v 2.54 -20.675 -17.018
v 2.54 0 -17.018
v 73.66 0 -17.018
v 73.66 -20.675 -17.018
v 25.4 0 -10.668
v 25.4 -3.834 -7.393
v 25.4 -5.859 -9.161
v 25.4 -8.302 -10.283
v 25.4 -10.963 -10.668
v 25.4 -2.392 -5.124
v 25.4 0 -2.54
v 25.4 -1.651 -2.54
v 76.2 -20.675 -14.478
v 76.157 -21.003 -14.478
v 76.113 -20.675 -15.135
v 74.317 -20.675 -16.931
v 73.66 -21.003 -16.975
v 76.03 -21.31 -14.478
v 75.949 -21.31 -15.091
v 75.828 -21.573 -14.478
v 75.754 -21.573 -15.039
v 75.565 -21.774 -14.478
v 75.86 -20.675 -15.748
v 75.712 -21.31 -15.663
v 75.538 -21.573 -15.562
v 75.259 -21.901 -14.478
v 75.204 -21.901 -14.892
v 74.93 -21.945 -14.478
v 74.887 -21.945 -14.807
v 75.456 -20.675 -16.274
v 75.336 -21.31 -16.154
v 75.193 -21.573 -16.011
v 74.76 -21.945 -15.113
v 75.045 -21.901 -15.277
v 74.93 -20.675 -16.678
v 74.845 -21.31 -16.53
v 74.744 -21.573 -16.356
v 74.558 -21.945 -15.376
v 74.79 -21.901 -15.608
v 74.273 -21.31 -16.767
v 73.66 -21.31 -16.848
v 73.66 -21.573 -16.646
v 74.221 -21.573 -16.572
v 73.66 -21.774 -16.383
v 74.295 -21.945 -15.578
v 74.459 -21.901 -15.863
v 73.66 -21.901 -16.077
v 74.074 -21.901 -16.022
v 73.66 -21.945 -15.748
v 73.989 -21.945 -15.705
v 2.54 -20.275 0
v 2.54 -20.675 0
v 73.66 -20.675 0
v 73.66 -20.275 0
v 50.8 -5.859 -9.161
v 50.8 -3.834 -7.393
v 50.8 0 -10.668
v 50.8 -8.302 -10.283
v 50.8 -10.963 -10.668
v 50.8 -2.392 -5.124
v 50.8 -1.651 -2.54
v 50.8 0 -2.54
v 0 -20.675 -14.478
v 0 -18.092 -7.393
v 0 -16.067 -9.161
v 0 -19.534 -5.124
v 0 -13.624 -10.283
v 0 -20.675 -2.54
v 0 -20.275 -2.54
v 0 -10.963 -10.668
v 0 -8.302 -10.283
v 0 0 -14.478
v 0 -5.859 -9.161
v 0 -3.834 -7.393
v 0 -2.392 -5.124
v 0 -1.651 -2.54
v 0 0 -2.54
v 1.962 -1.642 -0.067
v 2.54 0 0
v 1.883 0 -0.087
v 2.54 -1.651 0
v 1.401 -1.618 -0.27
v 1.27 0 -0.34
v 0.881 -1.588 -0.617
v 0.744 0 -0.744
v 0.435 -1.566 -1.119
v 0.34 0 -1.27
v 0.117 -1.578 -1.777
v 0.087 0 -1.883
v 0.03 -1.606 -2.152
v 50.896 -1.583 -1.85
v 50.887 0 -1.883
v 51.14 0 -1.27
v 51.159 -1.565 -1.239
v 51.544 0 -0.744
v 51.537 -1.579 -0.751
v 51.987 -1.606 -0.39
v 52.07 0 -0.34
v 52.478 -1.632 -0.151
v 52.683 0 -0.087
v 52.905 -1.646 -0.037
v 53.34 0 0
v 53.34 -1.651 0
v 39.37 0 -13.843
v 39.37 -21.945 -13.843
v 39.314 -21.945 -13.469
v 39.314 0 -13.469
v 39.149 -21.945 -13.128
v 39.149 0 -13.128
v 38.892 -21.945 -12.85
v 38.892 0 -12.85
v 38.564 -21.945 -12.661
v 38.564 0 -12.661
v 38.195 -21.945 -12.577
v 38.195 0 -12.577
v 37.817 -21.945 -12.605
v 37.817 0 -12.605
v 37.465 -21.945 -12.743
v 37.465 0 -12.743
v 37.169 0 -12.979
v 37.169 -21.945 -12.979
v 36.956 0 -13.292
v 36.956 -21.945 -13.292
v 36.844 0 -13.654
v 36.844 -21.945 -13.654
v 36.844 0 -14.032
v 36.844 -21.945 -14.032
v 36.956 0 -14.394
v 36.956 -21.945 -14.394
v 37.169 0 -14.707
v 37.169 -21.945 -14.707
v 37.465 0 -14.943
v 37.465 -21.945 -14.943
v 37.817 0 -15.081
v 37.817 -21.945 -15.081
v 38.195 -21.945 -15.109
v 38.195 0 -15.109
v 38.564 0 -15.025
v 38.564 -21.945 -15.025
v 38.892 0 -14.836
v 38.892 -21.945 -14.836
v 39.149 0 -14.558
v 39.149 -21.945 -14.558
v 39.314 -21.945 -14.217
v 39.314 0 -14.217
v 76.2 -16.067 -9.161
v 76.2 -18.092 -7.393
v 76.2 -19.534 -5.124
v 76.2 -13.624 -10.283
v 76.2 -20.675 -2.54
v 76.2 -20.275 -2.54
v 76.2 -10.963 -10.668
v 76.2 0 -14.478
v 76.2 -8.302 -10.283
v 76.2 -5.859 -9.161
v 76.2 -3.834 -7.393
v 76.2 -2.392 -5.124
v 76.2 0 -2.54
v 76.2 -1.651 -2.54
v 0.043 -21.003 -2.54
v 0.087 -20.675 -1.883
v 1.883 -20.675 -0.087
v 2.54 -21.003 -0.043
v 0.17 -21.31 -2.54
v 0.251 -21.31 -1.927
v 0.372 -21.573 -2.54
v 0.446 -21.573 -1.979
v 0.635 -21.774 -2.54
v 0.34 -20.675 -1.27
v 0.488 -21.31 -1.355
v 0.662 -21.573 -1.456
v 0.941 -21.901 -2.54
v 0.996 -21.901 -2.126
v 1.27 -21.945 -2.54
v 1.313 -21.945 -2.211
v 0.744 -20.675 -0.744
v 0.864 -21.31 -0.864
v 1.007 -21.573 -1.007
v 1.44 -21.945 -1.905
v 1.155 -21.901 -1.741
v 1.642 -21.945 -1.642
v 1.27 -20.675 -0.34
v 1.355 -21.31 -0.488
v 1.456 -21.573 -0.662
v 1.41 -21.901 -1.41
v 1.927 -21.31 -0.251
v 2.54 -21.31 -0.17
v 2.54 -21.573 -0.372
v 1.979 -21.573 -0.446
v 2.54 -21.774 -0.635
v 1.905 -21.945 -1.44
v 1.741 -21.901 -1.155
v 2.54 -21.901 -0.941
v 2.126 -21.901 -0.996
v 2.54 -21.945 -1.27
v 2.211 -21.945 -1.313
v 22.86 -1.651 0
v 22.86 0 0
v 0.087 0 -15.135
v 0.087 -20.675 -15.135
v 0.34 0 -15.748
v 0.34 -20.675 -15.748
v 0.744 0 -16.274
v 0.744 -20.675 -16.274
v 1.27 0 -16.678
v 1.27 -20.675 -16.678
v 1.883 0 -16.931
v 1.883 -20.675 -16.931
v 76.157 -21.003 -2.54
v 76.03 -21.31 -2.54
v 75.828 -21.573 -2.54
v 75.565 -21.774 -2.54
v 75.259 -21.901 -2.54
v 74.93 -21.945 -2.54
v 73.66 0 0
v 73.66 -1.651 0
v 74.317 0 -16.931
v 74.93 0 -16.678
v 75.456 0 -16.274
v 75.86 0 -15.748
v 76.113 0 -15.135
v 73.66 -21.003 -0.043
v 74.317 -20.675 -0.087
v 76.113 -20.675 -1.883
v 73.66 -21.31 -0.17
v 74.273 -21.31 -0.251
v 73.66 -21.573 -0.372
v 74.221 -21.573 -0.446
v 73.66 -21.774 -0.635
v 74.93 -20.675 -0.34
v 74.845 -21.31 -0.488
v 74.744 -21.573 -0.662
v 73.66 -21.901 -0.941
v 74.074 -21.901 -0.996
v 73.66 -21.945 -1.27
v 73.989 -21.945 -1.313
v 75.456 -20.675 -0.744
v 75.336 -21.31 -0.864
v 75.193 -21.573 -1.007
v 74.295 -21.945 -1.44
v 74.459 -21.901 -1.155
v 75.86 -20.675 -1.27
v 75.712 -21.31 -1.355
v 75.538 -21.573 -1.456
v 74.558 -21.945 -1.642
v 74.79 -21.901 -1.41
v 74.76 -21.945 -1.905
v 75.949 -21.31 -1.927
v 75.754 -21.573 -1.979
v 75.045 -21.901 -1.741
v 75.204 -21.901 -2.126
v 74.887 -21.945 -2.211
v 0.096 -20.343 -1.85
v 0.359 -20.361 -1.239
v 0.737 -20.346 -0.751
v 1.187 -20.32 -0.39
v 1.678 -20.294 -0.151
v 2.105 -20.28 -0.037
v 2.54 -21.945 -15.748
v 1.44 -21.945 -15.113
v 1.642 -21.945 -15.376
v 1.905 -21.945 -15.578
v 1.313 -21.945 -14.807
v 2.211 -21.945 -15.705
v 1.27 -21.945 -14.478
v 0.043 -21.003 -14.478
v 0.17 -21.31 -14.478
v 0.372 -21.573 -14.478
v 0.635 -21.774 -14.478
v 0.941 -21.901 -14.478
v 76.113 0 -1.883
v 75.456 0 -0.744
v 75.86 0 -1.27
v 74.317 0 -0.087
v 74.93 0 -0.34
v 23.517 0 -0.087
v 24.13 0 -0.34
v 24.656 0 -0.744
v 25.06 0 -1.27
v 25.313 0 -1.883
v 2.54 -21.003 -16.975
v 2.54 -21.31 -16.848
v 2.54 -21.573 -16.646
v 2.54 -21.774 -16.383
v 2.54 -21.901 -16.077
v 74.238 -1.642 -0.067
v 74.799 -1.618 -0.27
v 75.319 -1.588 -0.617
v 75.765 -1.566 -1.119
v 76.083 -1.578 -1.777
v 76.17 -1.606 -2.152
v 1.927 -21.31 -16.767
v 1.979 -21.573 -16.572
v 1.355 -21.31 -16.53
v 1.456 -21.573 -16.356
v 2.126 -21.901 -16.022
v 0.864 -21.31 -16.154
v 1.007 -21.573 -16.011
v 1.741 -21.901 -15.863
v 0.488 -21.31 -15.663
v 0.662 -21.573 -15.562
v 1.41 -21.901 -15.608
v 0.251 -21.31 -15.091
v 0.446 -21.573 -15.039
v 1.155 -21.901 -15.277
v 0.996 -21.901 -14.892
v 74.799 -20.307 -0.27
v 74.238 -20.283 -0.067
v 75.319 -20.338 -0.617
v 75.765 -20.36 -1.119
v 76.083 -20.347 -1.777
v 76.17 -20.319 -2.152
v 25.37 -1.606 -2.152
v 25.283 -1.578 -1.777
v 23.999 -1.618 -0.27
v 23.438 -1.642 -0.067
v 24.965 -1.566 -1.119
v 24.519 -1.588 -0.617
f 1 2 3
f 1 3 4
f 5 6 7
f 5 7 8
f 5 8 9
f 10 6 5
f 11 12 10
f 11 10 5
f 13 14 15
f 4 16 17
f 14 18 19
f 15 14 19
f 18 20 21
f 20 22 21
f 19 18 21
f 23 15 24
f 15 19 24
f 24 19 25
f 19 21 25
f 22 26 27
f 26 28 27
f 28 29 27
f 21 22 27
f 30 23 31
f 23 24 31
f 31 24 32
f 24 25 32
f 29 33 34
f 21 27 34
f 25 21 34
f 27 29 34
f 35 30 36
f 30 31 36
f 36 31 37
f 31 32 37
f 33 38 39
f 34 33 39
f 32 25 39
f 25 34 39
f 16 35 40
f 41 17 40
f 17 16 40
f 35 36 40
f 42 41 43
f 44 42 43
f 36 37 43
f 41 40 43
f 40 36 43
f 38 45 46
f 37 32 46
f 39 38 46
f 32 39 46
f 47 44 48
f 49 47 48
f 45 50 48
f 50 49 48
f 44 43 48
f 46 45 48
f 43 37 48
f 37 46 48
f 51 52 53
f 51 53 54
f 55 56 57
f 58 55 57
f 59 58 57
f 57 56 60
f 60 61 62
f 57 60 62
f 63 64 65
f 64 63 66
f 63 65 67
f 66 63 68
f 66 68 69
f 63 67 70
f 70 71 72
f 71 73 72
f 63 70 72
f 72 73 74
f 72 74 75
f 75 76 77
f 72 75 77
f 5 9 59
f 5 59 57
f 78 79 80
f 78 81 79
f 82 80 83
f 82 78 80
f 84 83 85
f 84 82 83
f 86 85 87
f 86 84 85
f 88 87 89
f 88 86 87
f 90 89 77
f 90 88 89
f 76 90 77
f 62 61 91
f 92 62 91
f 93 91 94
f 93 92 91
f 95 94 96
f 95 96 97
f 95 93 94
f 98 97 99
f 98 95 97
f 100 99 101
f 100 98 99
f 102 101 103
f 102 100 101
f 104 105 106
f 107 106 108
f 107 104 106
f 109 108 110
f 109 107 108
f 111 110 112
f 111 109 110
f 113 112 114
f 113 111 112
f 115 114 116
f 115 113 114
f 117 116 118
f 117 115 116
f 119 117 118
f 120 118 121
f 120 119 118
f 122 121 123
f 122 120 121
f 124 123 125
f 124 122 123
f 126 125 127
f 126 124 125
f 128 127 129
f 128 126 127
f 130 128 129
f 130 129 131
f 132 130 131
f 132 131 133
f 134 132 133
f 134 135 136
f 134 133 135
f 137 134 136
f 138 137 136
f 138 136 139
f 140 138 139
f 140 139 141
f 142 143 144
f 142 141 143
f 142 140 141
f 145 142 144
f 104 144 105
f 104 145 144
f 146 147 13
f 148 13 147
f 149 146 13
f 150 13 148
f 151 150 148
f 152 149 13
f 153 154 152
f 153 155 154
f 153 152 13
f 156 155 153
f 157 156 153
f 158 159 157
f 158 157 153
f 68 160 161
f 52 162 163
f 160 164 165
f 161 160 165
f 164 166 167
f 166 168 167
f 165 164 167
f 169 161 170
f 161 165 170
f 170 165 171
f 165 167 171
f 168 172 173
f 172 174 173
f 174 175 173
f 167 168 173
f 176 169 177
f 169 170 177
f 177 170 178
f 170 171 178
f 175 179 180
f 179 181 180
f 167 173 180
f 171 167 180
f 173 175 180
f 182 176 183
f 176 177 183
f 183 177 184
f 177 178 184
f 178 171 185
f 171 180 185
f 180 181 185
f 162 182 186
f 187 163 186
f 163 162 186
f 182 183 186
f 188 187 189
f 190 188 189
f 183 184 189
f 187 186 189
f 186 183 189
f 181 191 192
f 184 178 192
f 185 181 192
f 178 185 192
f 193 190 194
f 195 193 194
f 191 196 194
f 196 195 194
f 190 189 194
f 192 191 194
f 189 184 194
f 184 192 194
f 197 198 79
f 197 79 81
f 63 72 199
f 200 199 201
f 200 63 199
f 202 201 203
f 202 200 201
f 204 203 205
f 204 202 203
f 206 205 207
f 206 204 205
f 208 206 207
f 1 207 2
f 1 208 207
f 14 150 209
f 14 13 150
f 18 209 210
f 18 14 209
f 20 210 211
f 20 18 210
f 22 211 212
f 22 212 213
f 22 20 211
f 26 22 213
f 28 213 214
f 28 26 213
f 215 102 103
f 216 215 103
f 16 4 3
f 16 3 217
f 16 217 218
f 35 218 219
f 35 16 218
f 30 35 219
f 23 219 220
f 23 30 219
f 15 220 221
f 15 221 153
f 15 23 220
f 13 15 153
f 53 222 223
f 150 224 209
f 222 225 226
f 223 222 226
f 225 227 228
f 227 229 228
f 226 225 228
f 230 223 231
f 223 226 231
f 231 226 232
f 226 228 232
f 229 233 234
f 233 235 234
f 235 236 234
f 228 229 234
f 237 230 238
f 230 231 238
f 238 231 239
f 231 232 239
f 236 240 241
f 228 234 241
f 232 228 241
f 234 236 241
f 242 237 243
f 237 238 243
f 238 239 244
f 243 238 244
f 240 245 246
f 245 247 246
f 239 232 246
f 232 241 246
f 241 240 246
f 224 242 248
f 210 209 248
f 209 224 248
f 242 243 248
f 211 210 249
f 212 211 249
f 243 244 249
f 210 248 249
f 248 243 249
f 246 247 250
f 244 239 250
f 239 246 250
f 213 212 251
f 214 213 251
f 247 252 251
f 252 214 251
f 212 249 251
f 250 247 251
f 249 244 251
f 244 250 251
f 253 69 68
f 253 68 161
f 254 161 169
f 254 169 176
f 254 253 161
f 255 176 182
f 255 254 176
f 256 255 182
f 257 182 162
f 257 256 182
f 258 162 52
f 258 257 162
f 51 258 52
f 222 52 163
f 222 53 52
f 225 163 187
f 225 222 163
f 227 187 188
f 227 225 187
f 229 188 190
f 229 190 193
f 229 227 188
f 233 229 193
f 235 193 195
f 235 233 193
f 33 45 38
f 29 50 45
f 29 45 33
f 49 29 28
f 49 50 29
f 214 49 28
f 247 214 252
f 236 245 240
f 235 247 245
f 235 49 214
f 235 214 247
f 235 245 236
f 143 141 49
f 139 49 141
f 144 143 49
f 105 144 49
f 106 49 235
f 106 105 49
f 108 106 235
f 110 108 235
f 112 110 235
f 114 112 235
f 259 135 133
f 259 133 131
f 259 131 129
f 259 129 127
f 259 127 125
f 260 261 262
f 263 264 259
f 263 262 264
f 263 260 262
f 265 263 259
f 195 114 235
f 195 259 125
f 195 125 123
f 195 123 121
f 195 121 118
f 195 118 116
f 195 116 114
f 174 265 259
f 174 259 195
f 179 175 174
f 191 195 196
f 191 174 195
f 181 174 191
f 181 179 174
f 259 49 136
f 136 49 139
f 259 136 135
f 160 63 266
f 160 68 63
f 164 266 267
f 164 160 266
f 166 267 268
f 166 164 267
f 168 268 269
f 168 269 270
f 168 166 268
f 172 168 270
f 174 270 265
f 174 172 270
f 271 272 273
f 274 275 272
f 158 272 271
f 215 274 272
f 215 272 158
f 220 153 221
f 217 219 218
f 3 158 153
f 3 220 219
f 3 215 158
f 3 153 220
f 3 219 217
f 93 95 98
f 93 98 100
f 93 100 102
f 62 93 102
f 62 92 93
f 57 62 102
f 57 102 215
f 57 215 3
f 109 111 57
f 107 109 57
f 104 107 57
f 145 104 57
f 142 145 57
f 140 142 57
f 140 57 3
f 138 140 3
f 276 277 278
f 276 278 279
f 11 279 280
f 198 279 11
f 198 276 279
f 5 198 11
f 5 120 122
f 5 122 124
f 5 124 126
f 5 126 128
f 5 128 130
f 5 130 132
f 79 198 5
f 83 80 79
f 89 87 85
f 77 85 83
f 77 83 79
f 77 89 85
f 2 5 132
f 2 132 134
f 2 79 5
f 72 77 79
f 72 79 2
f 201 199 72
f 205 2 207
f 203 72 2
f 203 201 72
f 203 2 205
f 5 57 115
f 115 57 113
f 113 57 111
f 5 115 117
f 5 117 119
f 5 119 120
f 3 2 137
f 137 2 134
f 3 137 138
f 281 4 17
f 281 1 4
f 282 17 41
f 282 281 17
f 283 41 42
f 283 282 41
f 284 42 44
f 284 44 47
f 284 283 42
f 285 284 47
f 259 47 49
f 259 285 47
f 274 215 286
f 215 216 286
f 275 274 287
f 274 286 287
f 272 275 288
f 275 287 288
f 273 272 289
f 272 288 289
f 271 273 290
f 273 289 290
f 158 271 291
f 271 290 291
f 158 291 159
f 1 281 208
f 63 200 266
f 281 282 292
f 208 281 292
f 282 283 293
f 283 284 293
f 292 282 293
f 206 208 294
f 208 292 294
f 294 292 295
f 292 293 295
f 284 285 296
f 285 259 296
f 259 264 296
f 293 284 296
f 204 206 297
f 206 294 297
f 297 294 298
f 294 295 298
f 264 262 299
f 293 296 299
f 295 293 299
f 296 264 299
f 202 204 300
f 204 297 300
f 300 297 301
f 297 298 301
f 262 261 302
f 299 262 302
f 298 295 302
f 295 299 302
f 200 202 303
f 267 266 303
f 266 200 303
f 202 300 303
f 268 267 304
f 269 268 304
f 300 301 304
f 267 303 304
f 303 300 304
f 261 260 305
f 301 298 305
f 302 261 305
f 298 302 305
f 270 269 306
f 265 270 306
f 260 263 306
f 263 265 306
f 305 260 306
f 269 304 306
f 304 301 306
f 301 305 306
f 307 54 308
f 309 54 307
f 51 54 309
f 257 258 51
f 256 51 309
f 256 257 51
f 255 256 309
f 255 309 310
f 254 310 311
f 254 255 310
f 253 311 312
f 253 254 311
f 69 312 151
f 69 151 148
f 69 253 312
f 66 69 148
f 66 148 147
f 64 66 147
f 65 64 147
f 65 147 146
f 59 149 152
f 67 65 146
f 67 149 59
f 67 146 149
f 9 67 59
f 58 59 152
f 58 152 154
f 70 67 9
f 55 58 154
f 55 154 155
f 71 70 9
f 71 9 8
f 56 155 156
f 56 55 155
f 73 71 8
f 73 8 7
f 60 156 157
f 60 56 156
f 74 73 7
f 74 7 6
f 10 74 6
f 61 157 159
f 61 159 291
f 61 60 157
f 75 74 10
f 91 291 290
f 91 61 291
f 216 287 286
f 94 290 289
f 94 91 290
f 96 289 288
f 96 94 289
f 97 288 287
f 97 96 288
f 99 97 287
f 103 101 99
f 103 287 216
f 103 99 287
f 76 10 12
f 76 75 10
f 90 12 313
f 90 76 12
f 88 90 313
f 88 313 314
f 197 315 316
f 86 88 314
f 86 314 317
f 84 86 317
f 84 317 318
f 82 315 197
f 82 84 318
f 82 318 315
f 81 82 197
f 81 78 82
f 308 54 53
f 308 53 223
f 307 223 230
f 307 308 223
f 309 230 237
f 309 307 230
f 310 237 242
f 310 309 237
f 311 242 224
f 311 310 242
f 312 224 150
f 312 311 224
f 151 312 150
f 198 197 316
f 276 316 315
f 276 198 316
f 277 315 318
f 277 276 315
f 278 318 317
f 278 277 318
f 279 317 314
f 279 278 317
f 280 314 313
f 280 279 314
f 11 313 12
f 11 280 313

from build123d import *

# Parameters (mm, degrees)
PAD_DEPTH       = 76.2
SKETCH001_W     = 10.962794
SKETCH001_H     = 10.668
POCKET_DEPTH    = 12.7
SKETCH002_R     = 1.27
POCKET001_DEPTH = 21.945587
FILLET_R        = 2.54
FILLET001_R     = 1.27


with BuildPart() as part:
    # Sketch → Pad (new body)
    with BuildSketch(Plane.YZ):
        with BuildLine():
            Line((0, 0), (-1.651, 0))
            ThreePointArc((-20.274588, 0), (-10.962794, -10.668), (-1.651, 0))
            Line((-21.944587, 0), (-20.274588, 0))
            Line((-21.944587, -17.018), (-21.944587, 0))
            Line((0, -17.018), (-21.944587, -17.018))
            Line((0, 0), (0, -17.018))
        make_face()
    extrude(amount=PAD_DEPTH)

    # Sketch001 → Pocket (cut, symmetric)
    with BuildSketch(Plane.YZ.offset(38.1)):
        with Locations((-5.481397, -5.334)):
            Rectangle(SKETCH001_W, SKETCH001_H)
    extrude(amount=POCKET_DEPTH, both=True, mode=Mode.SUBTRACT)

    # Sketch002 → Pocket001 (cut, through all)
    with BuildSketch(Plane.XZ):
        with Locations((38.1, -13.843)):
            Circle(SKETCH002_R)
    extrude(amount=POCKET001_DEPTH, mode=Mode.SUBTRACT)

    # Fillet
    fillet_edges = [part.edges().sort_by_distance(p)[0] for p in [
        (0, -21.109587, 0),
        (0, -0.8255, 0),
        (76.2, -0.8255, 0),
        (76.2, -21.109587, 0),
        (25.4, -0.8255, 0),
        (50.8, -0.8255, 0),
        (0, -10.972294, -17.018),
        (76.2, -10.972294, -17.018),
    ]]
    fillet(fillet_edges, radius=FILLET_R)

    # Fillet001
    fillet001_edges = [part.edges().sort_by_distance(p)[0] for p in [
        (0, -21.944587, -8.509),
    ]]
    fillet(fillet001_edges, radius=FILLET001_R)


solid = part.part
